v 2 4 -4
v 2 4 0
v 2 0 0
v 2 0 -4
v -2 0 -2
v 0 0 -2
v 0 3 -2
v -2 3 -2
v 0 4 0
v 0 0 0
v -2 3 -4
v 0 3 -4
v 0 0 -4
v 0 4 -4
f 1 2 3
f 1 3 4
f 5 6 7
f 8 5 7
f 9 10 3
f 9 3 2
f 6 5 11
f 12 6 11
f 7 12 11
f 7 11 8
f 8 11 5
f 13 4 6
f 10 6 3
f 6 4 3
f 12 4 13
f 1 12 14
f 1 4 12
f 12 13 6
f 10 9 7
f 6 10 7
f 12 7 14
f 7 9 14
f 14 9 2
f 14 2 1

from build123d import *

# Parameters (mm, degrees)
SKETCH1_W           = 4
SKETCH1_H           = 4
BOSS_EXTRUDE1_DEPTH = 2
SKETCH2_W           = 2
SKETCH2_H           = 3
BOSS_EXTRUDE2_DEPTH = 2
CUT_EXTRUDE1_DEPTH  = 2


with BuildPart() as part:
    # Sketch1 → Boss-Extrude1 (new body)
    with BuildSketch(Plane(origin=(0, 0, 0), x_dir=(0, 0, -1), z_dir=(1, 0, 0))):
        with Locations((2, 2)):
            Rectangle(SKETCH1_W, SKETCH1_H)
    extrude(amount=BOSS_EXTRUDE1_DEPTH)

    # Sketch2 → Boss-Extrude2 (add)
    with BuildSketch(Plane.ZY):
        with Locations((-3, 1.5)):
            Rectangle(SKETCH2_W, SKETCH2_H)
    extrude(amount=BOSS_EXTRUDE2_DEPTH)

    # Sketch3 → Cut-Extrude1 (cut)
    with BuildSketch(Plane.ZY.offset(2)):
        Polygon((-2, 0), (-4, 3), (-4, 0), align=None)
    extrude(amount=-CUT_EXTRUDE1_DEPTH, mode=Mode.SUBTRACT)


solid = part.part
